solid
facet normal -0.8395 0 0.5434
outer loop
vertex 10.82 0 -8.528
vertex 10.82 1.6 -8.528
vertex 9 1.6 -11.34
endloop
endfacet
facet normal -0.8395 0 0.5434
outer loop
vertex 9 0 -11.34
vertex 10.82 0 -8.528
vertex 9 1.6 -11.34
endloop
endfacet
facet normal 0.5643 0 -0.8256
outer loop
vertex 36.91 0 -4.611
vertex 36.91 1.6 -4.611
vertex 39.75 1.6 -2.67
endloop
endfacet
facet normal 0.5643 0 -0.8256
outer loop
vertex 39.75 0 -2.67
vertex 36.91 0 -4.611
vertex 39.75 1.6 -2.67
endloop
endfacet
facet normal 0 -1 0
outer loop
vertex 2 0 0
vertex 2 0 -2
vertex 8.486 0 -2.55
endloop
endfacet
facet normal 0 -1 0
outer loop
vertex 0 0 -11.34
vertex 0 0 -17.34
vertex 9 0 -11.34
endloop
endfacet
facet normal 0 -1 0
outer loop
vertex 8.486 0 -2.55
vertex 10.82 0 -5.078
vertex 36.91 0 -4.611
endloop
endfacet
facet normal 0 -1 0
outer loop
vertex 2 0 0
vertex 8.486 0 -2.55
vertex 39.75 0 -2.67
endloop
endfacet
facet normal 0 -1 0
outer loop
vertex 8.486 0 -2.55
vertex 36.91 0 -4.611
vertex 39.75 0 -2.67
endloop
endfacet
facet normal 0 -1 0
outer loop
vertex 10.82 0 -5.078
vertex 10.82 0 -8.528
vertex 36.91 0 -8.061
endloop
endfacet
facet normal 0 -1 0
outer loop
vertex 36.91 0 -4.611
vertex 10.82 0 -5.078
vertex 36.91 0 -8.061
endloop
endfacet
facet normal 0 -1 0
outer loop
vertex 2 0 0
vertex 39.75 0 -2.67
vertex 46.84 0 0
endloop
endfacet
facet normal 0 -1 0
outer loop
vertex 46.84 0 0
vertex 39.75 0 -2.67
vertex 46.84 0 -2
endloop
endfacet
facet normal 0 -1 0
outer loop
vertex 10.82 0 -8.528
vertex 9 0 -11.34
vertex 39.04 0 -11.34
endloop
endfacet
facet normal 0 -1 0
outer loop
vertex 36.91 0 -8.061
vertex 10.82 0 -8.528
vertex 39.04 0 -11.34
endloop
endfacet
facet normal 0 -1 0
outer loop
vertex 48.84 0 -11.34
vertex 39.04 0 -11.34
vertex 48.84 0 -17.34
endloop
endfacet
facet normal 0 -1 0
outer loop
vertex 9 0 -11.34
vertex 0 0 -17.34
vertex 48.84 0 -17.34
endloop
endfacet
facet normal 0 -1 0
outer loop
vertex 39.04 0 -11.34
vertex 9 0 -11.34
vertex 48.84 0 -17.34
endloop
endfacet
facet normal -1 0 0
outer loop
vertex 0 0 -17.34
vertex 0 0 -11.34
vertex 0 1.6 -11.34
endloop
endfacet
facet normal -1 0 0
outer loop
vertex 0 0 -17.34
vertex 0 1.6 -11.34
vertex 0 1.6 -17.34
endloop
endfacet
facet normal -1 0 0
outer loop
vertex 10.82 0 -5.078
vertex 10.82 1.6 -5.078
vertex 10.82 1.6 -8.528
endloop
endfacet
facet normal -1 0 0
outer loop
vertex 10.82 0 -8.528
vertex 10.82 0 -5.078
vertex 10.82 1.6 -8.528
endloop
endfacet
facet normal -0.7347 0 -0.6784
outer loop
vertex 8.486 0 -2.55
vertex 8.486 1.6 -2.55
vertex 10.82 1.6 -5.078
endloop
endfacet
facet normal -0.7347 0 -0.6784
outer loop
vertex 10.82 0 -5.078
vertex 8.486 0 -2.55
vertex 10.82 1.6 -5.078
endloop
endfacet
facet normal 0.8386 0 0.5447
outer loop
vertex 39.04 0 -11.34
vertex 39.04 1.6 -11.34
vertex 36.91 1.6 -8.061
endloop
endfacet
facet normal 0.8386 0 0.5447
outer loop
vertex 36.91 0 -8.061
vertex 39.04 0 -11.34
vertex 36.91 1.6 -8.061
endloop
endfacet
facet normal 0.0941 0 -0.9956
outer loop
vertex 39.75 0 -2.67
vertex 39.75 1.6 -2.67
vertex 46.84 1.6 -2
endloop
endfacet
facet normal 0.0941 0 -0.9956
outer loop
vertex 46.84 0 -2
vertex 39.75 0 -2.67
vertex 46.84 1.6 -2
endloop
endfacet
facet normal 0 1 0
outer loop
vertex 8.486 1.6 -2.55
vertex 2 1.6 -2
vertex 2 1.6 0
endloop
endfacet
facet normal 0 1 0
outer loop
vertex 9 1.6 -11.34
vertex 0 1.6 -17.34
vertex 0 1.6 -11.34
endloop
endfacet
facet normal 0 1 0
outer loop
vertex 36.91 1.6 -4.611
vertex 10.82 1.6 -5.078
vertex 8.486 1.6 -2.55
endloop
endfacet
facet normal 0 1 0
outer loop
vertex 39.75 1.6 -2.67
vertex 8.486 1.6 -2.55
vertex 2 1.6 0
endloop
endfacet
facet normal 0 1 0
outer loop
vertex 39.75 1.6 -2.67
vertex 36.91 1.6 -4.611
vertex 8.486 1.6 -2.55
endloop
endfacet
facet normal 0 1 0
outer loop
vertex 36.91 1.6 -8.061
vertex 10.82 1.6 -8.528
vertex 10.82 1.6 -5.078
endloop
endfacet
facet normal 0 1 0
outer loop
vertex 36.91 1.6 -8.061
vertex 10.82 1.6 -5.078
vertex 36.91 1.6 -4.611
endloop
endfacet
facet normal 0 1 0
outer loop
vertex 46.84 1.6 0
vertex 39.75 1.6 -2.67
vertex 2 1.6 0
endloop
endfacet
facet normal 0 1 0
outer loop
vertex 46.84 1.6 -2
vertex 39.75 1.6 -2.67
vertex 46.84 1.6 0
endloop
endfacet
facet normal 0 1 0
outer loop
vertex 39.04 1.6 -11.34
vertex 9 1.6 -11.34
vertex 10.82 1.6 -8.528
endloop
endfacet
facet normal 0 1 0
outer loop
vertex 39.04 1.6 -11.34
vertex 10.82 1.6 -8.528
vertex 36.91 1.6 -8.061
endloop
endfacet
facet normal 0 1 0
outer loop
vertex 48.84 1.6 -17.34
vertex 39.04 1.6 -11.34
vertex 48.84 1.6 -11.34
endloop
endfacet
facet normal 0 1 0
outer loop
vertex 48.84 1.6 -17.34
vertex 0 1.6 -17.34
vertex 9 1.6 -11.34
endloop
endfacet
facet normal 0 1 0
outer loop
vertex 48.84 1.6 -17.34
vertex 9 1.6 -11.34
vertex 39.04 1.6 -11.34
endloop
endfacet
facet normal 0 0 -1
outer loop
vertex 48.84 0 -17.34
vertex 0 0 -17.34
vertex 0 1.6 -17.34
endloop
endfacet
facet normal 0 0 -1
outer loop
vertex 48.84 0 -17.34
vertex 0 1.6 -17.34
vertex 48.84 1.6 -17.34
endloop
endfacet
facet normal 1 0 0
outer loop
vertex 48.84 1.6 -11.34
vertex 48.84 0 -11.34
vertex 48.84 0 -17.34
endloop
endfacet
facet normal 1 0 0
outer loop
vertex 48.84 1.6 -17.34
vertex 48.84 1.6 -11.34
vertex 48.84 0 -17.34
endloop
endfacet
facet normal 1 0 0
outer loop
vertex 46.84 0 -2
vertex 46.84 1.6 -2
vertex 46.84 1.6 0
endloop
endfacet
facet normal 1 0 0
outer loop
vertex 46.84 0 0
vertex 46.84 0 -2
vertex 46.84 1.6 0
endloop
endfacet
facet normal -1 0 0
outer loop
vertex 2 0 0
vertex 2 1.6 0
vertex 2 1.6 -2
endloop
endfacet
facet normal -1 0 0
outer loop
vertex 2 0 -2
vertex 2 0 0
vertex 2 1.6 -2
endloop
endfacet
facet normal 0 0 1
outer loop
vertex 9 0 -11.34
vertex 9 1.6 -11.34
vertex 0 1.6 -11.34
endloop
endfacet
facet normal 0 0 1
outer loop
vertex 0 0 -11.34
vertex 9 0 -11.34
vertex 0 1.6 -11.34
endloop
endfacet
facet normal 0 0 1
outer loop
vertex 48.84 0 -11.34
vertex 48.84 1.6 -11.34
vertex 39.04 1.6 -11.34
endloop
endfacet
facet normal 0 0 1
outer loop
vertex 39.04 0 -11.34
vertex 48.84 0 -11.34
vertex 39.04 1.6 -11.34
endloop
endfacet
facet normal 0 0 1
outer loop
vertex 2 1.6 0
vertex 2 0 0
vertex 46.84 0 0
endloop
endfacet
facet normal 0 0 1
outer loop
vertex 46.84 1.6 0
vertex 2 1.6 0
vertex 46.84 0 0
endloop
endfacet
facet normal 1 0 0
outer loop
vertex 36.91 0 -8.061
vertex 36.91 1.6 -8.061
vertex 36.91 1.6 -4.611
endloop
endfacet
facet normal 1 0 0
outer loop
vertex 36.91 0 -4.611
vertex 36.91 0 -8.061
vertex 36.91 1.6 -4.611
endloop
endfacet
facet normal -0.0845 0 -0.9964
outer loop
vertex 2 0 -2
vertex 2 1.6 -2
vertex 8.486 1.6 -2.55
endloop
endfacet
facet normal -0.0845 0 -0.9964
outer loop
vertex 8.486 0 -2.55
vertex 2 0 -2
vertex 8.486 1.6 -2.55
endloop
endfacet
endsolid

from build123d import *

# Parameters (mm, degrees)
SKETCH1_W         = 48.84
SKETCH1_H         = 17.34
MAIN_SQUARE_DEPTH = 1.6
SERVO_HOLES_DEPTH = 1.6


with BuildPart() as part:
    # Sketch1 → main square (new body)
    with BuildSketch(Plane(origin=(0, 0, 0), x_dir=(1, 0, 0), z_dir=(0, 1, 0))):
        with Locations((24.42, 8.67)):
            Rectangle(SKETCH1_W, SKETCH1_H)
    extrude(amount=MAIN_SQUARE_DEPTH)

    # Sketch2 → servo holes (cut)
    with BuildSketch(Plane(origin=(0, 1.6, 0), x_dir=(1, 0, 0), z_dir=(0, 1, 0))):
        Polygon((46.84, 2), (46.84, 0), (48.84, 0), (48.84, 11.34), (39.04, 11.34), (36.91, 8.061097745), (36.91, 4.611097745), (39.750024568, 2.67), align=None)
        Polygon((9, 11.34), (0, 11.34), (0, 0), (2, 0), (2, 2), (8.486484798, 2.55), (10.82, 5.07751), (10.82, 8.52751), align=None)
    extrude(amount=-SERVO_HOLES_DEPTH, mode=Mode.SUBTRACT)


solid = part.part
